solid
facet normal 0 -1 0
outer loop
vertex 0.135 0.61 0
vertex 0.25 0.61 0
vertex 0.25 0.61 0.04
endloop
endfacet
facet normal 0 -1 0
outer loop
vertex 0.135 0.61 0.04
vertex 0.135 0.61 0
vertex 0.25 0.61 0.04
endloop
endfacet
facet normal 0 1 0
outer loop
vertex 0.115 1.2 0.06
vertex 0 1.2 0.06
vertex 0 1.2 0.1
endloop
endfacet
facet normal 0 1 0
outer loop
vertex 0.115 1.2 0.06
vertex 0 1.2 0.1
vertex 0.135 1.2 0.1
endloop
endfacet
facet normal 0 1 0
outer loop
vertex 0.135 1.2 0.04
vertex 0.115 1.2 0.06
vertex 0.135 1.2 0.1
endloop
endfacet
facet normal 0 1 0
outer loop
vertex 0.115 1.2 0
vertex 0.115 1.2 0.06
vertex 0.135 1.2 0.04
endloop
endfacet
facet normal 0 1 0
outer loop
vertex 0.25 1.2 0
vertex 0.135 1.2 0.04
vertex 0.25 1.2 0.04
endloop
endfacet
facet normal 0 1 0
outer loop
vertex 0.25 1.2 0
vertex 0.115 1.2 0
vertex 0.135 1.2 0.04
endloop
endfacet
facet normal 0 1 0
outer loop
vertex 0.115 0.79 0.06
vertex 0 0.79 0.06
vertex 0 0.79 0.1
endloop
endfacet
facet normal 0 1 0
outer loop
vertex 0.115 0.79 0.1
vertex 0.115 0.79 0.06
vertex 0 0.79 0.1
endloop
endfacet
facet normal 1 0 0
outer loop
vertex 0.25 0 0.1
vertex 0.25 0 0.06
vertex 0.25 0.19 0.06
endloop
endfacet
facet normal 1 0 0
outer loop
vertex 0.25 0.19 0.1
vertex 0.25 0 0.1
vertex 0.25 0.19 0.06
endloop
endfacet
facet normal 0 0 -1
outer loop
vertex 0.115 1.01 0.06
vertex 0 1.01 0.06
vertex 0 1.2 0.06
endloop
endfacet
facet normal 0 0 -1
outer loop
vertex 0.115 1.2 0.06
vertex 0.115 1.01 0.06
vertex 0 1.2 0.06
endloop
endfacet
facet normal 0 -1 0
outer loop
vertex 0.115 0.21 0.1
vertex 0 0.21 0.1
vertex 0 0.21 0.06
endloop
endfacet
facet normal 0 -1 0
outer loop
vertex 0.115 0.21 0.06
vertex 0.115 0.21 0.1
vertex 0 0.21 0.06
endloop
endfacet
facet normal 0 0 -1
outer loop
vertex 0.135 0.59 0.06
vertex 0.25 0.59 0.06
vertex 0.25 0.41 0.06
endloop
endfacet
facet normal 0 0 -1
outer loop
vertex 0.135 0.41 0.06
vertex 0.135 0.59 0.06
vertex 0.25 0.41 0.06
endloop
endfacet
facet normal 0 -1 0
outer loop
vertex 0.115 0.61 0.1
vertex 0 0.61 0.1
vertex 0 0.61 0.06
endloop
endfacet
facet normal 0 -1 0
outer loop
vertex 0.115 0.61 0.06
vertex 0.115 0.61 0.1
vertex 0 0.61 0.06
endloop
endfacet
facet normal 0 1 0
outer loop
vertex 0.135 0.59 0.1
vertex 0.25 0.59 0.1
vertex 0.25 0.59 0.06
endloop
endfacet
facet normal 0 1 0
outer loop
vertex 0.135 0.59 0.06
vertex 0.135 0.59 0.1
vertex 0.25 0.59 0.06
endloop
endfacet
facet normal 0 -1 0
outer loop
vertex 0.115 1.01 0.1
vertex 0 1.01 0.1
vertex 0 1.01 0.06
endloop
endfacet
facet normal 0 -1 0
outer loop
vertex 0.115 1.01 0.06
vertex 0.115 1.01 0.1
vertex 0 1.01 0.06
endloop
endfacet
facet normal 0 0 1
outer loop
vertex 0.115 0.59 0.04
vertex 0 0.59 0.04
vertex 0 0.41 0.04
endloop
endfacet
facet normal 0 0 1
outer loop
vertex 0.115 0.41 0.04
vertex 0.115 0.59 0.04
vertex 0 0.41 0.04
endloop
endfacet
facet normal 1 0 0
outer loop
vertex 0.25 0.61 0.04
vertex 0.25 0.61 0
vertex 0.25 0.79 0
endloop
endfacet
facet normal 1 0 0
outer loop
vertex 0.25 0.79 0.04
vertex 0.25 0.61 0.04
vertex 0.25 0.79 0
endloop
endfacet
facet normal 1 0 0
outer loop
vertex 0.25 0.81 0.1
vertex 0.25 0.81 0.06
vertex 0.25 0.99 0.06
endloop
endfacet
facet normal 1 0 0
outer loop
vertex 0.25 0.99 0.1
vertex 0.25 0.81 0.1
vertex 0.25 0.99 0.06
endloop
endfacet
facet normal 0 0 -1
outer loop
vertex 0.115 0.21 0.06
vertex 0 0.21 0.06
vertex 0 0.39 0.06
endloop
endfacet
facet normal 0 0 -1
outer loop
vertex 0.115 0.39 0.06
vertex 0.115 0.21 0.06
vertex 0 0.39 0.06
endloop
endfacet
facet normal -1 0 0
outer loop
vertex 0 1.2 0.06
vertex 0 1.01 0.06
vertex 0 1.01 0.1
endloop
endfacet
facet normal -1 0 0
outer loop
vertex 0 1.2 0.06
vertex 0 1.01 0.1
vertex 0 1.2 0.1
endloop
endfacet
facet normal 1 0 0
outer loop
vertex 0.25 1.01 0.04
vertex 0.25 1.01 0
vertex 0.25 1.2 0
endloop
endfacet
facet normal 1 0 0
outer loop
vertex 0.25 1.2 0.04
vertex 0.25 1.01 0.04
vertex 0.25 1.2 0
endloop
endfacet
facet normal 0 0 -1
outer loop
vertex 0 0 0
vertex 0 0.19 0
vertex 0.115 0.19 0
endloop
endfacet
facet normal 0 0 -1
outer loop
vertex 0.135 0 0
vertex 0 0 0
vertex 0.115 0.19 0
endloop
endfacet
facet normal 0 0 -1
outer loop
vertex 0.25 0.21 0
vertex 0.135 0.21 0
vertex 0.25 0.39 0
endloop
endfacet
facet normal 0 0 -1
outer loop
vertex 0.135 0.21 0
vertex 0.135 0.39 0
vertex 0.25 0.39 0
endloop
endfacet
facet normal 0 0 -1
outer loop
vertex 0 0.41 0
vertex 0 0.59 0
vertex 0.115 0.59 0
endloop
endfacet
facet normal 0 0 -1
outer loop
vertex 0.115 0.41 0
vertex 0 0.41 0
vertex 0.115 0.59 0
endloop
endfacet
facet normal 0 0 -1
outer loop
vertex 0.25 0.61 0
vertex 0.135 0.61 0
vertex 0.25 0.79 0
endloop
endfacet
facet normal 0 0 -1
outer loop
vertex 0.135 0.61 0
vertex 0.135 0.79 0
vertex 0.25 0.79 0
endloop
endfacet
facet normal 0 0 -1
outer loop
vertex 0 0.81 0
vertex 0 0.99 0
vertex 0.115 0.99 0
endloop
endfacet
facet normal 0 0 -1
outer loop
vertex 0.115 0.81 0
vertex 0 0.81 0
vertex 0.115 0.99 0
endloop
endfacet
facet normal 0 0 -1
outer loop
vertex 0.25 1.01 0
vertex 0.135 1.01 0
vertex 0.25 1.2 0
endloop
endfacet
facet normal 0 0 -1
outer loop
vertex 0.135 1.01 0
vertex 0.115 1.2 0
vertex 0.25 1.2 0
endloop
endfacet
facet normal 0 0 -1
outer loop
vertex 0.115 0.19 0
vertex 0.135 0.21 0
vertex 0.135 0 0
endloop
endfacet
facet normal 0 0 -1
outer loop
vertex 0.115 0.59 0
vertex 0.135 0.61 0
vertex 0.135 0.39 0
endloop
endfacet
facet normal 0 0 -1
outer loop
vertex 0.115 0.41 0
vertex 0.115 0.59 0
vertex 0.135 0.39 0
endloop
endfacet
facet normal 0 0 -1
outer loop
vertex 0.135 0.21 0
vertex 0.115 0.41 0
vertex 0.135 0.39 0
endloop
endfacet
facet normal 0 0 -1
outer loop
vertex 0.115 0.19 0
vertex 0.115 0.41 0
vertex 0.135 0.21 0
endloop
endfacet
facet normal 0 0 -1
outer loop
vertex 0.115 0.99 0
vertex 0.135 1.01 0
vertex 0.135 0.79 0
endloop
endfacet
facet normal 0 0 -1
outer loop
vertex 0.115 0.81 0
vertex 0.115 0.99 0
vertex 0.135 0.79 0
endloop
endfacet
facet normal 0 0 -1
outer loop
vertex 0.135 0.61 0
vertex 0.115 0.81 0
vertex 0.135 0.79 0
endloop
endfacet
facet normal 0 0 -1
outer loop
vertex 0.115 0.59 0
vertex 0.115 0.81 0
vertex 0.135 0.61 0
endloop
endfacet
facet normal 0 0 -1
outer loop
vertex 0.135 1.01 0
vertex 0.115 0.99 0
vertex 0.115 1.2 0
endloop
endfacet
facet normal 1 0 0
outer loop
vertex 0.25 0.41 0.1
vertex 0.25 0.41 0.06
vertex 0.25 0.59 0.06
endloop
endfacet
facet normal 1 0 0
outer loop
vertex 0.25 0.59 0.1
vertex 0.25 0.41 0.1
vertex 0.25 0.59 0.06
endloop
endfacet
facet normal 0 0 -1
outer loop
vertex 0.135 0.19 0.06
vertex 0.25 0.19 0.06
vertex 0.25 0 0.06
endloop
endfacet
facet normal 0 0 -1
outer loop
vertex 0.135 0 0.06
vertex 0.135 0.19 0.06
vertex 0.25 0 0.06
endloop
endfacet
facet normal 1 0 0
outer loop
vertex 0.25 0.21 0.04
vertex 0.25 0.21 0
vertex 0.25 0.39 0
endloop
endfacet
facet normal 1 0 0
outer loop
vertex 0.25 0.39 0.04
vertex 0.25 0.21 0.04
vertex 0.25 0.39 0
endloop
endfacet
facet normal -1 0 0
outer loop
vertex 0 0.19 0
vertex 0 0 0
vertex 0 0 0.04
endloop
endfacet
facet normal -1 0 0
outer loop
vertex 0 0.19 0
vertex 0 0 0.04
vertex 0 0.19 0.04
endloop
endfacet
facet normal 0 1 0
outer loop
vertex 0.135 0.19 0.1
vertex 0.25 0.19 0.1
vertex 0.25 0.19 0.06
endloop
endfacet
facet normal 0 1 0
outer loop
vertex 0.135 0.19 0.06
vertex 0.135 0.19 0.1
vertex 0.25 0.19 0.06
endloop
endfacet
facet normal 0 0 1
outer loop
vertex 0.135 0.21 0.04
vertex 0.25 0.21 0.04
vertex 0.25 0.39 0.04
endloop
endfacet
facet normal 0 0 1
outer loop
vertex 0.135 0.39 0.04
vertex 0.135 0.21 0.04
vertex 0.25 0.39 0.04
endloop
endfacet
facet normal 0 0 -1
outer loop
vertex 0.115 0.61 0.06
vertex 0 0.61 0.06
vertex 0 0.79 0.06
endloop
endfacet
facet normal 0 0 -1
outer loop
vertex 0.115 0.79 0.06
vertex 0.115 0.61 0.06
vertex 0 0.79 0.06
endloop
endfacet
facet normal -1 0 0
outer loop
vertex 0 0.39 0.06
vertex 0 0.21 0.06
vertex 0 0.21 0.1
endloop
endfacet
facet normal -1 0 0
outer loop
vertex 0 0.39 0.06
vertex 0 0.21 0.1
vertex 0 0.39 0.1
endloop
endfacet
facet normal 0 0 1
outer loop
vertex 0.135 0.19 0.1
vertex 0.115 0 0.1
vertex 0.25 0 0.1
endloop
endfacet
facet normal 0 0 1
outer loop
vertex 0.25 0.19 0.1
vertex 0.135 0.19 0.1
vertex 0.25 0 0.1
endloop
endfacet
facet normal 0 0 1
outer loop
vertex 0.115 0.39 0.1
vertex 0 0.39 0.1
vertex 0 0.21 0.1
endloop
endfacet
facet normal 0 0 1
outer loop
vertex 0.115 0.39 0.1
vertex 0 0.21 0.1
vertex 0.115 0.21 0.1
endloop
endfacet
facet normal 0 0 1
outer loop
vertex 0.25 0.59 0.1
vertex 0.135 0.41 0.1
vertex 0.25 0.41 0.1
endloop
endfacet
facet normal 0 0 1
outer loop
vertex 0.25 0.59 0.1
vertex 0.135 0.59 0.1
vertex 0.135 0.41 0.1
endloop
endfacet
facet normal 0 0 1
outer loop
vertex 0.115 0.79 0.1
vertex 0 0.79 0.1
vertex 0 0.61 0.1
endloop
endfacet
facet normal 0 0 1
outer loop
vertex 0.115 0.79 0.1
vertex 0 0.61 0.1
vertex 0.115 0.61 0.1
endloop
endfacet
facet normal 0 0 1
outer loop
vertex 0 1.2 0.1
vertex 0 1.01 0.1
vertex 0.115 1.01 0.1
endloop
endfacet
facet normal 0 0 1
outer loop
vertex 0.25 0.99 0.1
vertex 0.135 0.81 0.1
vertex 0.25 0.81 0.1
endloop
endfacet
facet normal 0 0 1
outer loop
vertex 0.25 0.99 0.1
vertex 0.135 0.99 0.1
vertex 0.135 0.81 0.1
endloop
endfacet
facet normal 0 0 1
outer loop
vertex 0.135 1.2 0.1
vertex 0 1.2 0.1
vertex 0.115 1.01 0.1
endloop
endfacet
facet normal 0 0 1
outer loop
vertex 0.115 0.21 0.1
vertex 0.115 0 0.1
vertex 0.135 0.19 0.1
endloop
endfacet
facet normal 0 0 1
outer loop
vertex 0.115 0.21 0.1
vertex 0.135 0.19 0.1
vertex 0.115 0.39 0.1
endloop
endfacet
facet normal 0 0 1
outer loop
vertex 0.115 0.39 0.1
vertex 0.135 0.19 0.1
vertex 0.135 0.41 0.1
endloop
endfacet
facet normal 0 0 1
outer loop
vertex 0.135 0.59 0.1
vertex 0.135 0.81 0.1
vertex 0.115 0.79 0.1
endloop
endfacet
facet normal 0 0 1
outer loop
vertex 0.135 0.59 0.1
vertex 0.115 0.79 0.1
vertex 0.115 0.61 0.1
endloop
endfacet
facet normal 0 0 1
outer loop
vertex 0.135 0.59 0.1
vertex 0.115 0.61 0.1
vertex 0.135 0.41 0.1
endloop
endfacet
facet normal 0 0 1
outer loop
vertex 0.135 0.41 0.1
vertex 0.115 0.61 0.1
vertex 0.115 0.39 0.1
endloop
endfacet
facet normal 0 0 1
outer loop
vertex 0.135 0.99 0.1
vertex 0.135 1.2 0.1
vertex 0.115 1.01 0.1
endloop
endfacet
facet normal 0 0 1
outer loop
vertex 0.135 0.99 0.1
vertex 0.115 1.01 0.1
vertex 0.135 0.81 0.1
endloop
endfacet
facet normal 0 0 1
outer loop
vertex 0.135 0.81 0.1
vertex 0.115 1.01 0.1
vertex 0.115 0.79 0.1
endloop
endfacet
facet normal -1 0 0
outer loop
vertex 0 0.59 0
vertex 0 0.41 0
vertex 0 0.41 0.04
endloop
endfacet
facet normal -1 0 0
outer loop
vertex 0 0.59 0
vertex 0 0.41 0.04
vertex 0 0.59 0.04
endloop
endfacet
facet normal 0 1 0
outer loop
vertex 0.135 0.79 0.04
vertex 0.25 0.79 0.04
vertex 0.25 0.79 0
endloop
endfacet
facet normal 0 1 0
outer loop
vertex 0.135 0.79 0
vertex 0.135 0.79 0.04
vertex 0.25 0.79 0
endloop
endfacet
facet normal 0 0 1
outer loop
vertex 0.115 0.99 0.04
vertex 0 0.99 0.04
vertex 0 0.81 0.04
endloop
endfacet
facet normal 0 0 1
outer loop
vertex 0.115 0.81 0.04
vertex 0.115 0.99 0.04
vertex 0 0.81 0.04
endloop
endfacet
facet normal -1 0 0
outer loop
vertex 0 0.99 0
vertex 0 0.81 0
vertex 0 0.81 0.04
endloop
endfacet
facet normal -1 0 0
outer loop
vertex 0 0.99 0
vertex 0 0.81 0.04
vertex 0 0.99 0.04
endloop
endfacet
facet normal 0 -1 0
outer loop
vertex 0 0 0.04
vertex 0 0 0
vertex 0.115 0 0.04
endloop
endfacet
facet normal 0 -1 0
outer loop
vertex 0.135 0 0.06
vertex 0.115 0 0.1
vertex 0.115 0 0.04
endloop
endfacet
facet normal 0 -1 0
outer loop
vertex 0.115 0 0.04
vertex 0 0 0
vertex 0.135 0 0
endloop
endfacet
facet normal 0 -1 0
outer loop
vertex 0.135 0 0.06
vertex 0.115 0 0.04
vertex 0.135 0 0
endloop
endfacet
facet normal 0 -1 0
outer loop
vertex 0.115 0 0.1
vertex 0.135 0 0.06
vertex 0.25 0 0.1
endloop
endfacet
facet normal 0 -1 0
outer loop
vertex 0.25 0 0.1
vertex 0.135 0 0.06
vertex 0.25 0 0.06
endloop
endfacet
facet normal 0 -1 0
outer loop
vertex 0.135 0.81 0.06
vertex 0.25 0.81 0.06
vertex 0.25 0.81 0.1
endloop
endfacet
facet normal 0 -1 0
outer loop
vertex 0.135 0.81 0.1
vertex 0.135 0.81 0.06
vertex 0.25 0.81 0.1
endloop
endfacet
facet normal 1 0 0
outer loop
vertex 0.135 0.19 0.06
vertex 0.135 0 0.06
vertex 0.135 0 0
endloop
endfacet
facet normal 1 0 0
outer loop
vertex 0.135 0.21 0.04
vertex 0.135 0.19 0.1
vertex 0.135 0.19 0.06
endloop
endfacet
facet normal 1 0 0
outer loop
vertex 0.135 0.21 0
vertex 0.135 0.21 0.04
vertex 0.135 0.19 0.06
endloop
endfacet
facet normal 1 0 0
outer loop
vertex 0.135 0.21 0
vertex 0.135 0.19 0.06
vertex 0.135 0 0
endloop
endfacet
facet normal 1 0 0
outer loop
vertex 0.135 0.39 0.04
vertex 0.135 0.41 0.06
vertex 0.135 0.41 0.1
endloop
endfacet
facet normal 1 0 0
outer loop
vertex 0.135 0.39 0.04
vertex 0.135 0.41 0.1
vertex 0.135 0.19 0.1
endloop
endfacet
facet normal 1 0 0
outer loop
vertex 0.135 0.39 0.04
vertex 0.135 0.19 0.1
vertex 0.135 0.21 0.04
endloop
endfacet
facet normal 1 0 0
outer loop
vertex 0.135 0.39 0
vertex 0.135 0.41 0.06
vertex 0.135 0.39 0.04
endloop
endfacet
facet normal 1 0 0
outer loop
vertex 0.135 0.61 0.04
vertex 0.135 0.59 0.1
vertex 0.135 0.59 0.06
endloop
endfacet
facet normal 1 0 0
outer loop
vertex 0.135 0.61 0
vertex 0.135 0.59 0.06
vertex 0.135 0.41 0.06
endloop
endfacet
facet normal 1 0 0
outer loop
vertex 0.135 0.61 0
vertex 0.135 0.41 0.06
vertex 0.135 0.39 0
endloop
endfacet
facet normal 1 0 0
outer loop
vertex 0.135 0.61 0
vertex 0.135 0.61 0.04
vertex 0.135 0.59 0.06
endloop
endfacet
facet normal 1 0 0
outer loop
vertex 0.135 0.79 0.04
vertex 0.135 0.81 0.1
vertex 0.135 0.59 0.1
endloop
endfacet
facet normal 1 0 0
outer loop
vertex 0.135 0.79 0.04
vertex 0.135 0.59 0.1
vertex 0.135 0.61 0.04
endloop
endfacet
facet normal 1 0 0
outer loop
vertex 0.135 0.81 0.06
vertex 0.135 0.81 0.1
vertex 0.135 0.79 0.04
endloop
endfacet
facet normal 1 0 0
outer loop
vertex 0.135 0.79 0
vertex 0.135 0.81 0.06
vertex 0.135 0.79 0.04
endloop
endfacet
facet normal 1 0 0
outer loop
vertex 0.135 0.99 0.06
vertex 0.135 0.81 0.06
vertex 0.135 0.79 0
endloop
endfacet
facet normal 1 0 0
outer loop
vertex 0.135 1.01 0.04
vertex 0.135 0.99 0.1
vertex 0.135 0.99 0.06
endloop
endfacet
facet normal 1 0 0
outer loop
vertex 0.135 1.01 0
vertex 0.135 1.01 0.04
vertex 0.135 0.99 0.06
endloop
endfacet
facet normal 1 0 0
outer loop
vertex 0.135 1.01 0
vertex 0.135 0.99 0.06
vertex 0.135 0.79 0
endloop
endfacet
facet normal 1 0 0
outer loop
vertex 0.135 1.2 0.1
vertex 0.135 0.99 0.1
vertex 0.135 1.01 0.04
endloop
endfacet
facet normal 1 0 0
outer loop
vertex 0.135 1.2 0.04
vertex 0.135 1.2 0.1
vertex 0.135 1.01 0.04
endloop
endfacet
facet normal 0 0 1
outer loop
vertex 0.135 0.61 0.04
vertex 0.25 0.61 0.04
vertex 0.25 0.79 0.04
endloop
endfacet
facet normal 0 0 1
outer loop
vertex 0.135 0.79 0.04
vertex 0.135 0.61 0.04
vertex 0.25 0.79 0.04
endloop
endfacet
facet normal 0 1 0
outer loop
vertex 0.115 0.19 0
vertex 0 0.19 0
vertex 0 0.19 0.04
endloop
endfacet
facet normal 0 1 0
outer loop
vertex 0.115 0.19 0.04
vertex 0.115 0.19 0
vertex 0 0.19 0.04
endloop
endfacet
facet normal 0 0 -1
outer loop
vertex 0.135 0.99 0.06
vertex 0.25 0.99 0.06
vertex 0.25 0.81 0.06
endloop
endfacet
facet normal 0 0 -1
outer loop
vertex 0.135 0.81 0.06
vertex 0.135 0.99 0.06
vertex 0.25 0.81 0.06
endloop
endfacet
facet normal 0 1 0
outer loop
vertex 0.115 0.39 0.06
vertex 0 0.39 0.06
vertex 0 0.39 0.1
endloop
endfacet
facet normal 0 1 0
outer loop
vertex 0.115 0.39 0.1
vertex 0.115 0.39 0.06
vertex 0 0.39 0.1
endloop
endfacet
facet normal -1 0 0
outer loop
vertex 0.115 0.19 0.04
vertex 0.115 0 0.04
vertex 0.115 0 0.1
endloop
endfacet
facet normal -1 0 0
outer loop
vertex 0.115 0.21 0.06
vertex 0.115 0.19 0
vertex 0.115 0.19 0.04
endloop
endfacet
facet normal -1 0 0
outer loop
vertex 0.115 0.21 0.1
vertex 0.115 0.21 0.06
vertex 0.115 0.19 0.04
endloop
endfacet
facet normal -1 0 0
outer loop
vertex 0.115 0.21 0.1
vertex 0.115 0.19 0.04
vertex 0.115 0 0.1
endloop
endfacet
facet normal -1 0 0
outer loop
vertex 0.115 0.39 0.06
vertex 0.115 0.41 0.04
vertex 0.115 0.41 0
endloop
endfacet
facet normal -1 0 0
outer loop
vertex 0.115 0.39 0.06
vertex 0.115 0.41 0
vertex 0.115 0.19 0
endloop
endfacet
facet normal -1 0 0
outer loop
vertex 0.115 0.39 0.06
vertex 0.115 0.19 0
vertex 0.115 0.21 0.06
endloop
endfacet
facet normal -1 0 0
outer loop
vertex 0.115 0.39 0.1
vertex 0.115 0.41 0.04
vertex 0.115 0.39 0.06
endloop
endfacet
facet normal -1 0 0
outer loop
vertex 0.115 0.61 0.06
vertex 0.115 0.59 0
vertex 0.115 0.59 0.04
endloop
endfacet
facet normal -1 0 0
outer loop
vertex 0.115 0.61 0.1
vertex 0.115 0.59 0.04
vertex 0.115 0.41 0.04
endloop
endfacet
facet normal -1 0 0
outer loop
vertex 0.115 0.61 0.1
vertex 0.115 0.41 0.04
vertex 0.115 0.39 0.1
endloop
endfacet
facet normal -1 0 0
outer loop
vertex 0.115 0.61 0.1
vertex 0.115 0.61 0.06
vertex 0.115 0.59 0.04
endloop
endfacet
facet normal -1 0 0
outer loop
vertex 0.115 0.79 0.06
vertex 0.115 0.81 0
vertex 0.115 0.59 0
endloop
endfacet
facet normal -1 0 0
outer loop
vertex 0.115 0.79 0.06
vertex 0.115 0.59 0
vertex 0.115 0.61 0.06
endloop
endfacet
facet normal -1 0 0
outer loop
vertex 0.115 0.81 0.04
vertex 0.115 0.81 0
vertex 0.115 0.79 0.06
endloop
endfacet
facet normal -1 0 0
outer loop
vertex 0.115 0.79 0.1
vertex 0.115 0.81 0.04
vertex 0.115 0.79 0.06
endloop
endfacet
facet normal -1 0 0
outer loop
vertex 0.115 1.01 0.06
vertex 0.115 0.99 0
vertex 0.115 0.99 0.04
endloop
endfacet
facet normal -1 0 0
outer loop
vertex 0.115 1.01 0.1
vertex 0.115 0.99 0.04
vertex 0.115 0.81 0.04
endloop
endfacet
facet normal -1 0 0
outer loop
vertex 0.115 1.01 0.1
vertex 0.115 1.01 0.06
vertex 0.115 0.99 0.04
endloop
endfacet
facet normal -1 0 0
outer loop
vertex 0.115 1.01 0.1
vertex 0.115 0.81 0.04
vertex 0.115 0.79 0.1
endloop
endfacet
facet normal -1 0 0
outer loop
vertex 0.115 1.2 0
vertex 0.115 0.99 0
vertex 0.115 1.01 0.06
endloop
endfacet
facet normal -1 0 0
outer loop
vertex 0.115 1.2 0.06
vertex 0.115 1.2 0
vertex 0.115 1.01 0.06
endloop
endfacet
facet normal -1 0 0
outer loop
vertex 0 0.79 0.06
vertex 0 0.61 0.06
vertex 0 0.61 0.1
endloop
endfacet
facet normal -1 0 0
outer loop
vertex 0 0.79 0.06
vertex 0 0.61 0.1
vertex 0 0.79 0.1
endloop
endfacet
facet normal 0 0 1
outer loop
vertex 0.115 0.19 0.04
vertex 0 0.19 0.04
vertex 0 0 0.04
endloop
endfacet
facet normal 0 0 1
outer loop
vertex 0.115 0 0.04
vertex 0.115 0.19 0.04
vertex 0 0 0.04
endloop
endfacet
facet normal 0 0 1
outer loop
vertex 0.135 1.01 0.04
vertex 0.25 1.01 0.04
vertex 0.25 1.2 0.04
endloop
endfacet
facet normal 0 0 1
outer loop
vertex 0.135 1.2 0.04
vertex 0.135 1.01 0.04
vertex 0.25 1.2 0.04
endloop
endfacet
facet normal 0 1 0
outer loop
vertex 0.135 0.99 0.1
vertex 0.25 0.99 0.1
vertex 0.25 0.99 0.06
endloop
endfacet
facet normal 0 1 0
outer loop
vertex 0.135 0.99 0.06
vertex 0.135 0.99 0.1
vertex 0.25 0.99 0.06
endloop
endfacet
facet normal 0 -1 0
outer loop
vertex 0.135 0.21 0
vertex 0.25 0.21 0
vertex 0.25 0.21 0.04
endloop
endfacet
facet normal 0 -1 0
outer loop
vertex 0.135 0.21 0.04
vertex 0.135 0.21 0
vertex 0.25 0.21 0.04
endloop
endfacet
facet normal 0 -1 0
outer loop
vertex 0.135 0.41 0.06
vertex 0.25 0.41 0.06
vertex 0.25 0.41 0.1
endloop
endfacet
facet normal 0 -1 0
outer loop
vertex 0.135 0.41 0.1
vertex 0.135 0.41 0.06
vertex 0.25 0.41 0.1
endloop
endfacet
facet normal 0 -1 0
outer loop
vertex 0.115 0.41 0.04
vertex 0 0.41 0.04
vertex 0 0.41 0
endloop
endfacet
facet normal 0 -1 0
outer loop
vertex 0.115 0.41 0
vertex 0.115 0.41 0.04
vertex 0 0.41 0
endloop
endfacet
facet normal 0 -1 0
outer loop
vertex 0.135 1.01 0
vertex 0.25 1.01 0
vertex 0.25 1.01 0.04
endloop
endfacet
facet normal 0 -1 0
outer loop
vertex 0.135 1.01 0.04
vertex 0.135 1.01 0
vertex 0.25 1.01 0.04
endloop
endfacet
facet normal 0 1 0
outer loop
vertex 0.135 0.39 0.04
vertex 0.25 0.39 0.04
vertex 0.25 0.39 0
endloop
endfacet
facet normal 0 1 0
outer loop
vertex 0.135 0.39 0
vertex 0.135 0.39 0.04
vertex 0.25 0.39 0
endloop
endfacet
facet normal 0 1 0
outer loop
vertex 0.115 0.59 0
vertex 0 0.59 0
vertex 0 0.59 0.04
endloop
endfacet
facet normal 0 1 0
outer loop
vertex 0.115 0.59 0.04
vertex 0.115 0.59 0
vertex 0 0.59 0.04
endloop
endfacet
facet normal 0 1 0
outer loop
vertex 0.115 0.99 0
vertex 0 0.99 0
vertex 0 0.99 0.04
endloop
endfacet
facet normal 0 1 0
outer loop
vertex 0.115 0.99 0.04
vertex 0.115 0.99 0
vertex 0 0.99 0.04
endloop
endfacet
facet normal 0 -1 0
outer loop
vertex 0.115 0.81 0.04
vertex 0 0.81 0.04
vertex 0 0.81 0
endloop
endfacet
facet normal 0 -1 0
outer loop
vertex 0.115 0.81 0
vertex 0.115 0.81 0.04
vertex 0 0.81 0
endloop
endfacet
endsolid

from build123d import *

# Parameters (mm, degrees)
SKETCH1_W           = 0.25
SKETCH1_H           = 1.2
BOSS_EXTRUDE1_DEPTH = 0.1
CUT_EXTRUDE1_DEPTH  = 0.115
CUT_EXTRUDE2_DEPTH  = 0.115


with BuildPart() as part:
    # Sketch1 → Boss-Extrude1 (new body)
    with BuildSketch(Plane.XY):
        with Locations((0.125, 0.6)):
            Rectangle(SKETCH1_W, SKETCH1_H)
    extrude(amount=BOSS_EXTRUDE1_DEPTH)

    # Sketch2 → Cut-Extrude1 (cut)
    with BuildSketch(Plane(origin=(0.25, 0, 0), x_dir=(0, 0, -1), z_dir=(1, 0, 0))):
        Polygon((-0.04, 1.2), (-0.1, 1.2), (-0.1, 0.99), (-0.06, 0.99), (-0.06, 0.81), (-0.1, 0.81), (-0.1, 0.59), (-0.06, 0.59), (-0.06, 0.41), (-0.1, 0.41), (-0.1, 0.19), (-0.06, 0.19), (-0.06, 0), (0, 0), (0, 0.21), (-0.04, 0.21), (-0.04, 0.39), (0, 0.39), (0, 0.61), (-0.04, 0.61), (-0.04, 0.79), (0, 0.79), (0, 1.01), (-0.04, 1.01), align=None)
    extrude(amount=-CUT_EXTRUDE1_DEPTH, mode=Mode.SUBTRACT)

    # Sketch3 → Cut-Extrude2 (cut)
    with BuildSketch(Plane.ZY):
        Polygon((0.06, 1.01), (0.06, 1.2), (0, 1.2), (0, 0.99), (0.04, 0.99), (0.04, 0.81), (0, 0.81), (0, 0.59), (0.04, 0.59), (0.04, 0.41), (0, 0.41), (0, 0.19), (0.04, 0.19), (0.04, 0), (0.1, 0), (0.1, 0.21), (0.06, 0.21), (0.06, 0.39), (0.1, 0.39), (0.1, 0.61), (0.06, 0.61), (0.06, 0.79), (0.1, 0.79), (0.1, 1.01), align=None)
    extrude(amount=-CUT_EXTRUDE2_DEPTH, mode=Mode.SUBTRACT)


solid = part.part
